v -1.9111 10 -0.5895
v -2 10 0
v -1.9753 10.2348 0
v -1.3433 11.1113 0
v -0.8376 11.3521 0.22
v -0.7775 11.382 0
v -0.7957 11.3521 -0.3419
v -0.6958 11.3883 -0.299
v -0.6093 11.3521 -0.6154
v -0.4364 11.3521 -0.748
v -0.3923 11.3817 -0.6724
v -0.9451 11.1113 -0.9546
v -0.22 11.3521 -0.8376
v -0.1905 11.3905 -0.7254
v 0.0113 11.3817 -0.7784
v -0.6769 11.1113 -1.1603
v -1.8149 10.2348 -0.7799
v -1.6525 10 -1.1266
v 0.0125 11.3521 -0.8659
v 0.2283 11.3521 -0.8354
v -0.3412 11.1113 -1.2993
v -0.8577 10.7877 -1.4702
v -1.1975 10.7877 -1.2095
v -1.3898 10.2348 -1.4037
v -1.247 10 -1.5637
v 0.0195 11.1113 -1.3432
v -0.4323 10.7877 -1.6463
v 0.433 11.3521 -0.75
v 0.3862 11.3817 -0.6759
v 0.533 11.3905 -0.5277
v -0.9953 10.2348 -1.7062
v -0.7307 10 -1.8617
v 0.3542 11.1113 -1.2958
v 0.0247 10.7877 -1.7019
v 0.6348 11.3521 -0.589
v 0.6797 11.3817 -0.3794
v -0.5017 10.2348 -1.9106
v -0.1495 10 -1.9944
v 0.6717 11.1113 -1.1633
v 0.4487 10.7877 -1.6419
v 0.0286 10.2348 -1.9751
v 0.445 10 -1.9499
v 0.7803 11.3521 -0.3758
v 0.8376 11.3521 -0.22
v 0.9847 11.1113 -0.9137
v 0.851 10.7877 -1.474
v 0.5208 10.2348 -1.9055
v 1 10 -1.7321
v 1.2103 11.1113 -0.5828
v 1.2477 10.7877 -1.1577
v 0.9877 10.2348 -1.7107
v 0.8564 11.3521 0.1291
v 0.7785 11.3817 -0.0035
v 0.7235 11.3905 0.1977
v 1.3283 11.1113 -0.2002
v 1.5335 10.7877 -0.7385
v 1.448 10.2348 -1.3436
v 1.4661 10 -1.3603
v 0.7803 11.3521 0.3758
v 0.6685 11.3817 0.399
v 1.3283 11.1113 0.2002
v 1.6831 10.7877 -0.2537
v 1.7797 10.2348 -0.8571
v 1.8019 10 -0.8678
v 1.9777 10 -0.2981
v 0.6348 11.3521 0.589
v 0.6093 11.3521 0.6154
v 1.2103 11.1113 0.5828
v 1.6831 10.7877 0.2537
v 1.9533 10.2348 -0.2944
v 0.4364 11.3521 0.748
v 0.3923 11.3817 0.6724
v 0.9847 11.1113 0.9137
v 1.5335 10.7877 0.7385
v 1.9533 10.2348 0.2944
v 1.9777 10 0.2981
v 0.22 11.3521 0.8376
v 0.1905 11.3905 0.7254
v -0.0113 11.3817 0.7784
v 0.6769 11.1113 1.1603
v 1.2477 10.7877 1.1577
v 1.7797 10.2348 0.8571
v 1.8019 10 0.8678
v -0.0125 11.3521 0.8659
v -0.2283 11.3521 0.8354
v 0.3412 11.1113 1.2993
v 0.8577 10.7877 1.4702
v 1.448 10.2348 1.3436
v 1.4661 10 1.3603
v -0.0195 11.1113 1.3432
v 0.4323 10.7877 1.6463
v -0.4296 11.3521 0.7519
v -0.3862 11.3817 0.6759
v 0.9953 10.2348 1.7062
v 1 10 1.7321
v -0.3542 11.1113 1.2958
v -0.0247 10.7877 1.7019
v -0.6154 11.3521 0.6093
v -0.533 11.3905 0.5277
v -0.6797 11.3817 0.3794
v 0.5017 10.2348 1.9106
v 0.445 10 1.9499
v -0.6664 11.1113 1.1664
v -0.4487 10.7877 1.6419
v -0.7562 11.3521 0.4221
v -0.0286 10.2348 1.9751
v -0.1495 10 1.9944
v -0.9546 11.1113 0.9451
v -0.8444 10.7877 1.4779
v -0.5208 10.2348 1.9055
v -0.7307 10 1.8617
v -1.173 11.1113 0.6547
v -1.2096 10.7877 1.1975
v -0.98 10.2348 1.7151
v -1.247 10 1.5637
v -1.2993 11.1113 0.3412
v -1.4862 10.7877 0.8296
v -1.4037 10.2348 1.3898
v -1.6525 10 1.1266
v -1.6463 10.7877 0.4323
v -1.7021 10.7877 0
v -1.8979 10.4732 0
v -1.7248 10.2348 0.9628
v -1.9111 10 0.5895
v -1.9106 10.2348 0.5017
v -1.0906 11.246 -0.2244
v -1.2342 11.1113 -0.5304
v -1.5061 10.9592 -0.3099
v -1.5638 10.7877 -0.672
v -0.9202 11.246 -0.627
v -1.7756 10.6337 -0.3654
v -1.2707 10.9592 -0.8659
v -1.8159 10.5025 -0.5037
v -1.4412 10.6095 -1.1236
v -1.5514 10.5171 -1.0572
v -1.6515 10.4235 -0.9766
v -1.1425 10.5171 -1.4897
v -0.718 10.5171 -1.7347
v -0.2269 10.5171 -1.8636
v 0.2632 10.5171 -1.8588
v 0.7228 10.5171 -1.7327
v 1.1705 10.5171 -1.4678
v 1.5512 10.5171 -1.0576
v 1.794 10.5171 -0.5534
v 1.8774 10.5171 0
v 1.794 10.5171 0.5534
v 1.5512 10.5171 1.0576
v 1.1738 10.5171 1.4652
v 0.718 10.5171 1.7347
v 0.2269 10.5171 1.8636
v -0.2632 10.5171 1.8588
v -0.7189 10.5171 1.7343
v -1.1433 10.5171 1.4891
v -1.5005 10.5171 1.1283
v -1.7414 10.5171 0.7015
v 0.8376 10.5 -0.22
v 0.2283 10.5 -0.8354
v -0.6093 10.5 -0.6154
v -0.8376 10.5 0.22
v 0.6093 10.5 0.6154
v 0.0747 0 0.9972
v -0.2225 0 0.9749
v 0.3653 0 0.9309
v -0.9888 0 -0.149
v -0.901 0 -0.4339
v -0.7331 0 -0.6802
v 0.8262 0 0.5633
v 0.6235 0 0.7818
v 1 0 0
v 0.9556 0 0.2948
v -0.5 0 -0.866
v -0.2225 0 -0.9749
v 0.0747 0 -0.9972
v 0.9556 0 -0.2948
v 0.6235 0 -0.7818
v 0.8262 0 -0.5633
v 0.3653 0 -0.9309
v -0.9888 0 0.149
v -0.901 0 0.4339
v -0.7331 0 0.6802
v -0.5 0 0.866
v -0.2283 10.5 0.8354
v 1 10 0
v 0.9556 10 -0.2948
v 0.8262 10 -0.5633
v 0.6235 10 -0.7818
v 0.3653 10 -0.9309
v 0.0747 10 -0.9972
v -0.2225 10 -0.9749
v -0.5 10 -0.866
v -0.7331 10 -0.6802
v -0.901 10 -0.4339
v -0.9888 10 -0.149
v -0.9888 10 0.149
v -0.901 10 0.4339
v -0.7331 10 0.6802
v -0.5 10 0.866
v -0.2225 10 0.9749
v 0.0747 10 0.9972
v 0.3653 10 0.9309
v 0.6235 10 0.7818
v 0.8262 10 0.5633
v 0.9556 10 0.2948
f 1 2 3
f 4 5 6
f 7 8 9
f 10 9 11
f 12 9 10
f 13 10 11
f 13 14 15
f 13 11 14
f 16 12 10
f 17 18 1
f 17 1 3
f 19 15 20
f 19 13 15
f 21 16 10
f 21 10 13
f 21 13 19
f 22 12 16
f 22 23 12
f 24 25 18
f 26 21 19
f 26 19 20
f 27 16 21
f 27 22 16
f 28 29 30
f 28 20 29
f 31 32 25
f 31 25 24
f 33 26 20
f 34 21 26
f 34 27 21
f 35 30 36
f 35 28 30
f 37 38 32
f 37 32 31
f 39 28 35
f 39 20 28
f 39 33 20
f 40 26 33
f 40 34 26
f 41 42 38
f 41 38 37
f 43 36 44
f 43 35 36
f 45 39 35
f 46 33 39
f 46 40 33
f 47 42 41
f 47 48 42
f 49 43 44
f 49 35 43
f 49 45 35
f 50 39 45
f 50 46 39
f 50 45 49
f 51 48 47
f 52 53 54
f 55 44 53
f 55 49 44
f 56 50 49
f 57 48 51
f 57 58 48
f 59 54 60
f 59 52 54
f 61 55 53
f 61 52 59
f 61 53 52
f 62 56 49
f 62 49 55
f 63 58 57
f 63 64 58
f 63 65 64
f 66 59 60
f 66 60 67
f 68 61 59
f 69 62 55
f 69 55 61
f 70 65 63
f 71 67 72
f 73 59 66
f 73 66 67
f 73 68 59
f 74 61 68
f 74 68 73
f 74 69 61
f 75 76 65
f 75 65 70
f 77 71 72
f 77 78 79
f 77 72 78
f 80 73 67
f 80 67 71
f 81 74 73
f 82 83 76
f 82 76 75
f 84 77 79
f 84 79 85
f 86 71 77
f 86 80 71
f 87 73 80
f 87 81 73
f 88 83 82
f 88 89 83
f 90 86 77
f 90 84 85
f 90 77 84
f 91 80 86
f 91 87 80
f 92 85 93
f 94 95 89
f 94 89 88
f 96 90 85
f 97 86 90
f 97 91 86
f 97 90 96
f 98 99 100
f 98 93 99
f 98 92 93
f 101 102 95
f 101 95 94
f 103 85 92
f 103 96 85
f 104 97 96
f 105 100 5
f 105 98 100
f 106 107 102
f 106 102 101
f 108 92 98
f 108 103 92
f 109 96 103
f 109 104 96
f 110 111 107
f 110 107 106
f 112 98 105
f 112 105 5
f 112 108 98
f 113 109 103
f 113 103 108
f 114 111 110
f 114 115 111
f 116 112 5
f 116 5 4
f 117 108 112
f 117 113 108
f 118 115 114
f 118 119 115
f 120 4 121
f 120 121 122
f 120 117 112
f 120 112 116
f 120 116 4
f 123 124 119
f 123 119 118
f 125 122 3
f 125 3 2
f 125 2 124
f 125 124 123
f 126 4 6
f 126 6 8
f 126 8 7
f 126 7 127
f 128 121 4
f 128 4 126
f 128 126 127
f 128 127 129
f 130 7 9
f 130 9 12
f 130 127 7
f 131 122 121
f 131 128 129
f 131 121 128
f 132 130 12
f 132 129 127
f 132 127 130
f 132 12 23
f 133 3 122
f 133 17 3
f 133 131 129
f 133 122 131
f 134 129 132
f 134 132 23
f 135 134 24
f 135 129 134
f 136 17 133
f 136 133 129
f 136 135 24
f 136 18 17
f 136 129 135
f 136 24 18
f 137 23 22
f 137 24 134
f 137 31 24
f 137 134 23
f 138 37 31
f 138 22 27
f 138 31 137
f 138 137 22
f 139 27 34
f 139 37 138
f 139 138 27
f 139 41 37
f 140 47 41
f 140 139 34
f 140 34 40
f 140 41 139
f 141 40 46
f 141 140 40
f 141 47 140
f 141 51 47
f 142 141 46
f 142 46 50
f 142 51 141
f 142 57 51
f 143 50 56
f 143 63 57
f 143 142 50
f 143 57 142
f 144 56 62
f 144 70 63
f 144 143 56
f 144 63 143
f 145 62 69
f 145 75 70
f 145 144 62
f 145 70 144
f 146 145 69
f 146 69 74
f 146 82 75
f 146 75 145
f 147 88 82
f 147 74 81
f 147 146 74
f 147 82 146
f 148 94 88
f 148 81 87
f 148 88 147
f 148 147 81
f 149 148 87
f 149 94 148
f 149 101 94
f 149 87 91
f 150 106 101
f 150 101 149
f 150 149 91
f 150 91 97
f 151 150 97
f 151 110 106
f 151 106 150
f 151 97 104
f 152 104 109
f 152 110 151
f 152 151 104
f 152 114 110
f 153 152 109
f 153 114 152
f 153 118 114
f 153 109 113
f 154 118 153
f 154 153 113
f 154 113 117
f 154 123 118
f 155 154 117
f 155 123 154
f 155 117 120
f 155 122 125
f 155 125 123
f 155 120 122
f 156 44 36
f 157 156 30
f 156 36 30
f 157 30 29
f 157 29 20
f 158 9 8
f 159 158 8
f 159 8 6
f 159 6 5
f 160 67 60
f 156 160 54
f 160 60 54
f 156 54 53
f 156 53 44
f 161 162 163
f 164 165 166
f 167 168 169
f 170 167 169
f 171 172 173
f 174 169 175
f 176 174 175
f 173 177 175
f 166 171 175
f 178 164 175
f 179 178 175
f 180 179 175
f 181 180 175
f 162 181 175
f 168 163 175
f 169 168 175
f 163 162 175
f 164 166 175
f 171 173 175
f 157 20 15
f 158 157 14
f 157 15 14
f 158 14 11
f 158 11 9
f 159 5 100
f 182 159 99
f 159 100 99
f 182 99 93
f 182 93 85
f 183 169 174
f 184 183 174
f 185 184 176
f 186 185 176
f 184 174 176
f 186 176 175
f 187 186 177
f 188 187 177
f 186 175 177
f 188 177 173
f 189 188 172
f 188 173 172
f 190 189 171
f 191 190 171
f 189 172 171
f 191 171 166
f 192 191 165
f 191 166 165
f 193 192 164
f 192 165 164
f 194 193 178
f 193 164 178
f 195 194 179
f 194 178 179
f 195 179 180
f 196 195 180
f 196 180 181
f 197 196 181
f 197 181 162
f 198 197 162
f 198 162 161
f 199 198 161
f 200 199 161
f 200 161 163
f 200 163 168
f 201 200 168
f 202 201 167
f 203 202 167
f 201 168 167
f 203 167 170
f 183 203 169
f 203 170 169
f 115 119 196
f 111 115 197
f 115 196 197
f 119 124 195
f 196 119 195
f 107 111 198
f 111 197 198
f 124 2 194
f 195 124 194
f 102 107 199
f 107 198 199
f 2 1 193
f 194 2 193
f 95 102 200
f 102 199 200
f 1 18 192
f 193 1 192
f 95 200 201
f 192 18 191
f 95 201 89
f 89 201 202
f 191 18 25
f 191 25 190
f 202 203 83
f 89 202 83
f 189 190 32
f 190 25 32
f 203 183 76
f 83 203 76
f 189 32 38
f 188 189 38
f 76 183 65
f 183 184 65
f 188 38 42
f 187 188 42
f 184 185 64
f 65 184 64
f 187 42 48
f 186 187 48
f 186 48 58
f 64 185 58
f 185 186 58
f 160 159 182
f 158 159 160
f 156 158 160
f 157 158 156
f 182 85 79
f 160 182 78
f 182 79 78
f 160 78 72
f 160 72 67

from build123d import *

# Parameters (mm, degrees)
SKETCH_1_R          = 1
EXTRUDE_1_DEPTH     = 10
SKETCH_2_R          = 2
EXTRUDE_2_DEPTH     = 1.5
CUT_EXTRUDE_1_DEPTH = 1


with BuildPart() as part:
    # 草图1 → 凸台-拉伸1 (new body)
    with BuildSketch(Plane(origin=(0, 0, 0), x_dir=(1, 0, 0), z_dir=(0, 1, 0))):
        Circle(SKETCH_1_R)
    extrude(amount=EXTRUDE_1_DEPTH)

    # 草图2 → 凸台-拉伸2 (add)
    with BuildSketch(Plane(origin=(0, 10, 0), x_dir=(1, 0, 0), z_dir=(0, 1, 0))):
        Circle(SKETCH_2_R)
    extrude(amount=EXTRUDE_2_DEPTH)

    # 草图3 → 切除-拉伸1 (cut)
    with BuildSketch(Plane(origin=(0, 11.5, 0), x_dir=(1, 0, 0), z_dir=(0, 1, 0))):
        Polygon((0.609304592, -0.615424987), (0.837625969, 0.219960762), (0.228321377, 0.835385749), (-0.609304592, 0.615424987), (-0.837625969, -0.219960762), (-0.228321377, -0.835385749), align=None)
    extrude(amount=-CUT_EXTRUDE_1_DEPTH, mode=Mode.SUBTRACT)

    # 草图5 → 切除-旋转4 (revolve, cut)
    with BuildSketch(Plane.XY):
        with BuildLine():
            add(Edge.make_bspline(
                [(-0.5, 11.452368755), (-2, 11.161895004), (-2, 10)],
                knots=[4.965069236, 4.965069236, 4.965069236, 6.283185307, 6.283185307, 6.283185307], degree=2, weights=[1, 0.790569415, 1]))
            Line((-2, 10), (-2, 11.5))
            Line((-2, 11.5), (-0.5, 11.5))
            Line((-0.5, 11.5), (-0.5, 11.452368755))
        make_face()
    revolve(axis=Axis((0, 11.5, 0), (0, -1, 0)), mode=Mode.SUBTRACT)


solid = part.part
